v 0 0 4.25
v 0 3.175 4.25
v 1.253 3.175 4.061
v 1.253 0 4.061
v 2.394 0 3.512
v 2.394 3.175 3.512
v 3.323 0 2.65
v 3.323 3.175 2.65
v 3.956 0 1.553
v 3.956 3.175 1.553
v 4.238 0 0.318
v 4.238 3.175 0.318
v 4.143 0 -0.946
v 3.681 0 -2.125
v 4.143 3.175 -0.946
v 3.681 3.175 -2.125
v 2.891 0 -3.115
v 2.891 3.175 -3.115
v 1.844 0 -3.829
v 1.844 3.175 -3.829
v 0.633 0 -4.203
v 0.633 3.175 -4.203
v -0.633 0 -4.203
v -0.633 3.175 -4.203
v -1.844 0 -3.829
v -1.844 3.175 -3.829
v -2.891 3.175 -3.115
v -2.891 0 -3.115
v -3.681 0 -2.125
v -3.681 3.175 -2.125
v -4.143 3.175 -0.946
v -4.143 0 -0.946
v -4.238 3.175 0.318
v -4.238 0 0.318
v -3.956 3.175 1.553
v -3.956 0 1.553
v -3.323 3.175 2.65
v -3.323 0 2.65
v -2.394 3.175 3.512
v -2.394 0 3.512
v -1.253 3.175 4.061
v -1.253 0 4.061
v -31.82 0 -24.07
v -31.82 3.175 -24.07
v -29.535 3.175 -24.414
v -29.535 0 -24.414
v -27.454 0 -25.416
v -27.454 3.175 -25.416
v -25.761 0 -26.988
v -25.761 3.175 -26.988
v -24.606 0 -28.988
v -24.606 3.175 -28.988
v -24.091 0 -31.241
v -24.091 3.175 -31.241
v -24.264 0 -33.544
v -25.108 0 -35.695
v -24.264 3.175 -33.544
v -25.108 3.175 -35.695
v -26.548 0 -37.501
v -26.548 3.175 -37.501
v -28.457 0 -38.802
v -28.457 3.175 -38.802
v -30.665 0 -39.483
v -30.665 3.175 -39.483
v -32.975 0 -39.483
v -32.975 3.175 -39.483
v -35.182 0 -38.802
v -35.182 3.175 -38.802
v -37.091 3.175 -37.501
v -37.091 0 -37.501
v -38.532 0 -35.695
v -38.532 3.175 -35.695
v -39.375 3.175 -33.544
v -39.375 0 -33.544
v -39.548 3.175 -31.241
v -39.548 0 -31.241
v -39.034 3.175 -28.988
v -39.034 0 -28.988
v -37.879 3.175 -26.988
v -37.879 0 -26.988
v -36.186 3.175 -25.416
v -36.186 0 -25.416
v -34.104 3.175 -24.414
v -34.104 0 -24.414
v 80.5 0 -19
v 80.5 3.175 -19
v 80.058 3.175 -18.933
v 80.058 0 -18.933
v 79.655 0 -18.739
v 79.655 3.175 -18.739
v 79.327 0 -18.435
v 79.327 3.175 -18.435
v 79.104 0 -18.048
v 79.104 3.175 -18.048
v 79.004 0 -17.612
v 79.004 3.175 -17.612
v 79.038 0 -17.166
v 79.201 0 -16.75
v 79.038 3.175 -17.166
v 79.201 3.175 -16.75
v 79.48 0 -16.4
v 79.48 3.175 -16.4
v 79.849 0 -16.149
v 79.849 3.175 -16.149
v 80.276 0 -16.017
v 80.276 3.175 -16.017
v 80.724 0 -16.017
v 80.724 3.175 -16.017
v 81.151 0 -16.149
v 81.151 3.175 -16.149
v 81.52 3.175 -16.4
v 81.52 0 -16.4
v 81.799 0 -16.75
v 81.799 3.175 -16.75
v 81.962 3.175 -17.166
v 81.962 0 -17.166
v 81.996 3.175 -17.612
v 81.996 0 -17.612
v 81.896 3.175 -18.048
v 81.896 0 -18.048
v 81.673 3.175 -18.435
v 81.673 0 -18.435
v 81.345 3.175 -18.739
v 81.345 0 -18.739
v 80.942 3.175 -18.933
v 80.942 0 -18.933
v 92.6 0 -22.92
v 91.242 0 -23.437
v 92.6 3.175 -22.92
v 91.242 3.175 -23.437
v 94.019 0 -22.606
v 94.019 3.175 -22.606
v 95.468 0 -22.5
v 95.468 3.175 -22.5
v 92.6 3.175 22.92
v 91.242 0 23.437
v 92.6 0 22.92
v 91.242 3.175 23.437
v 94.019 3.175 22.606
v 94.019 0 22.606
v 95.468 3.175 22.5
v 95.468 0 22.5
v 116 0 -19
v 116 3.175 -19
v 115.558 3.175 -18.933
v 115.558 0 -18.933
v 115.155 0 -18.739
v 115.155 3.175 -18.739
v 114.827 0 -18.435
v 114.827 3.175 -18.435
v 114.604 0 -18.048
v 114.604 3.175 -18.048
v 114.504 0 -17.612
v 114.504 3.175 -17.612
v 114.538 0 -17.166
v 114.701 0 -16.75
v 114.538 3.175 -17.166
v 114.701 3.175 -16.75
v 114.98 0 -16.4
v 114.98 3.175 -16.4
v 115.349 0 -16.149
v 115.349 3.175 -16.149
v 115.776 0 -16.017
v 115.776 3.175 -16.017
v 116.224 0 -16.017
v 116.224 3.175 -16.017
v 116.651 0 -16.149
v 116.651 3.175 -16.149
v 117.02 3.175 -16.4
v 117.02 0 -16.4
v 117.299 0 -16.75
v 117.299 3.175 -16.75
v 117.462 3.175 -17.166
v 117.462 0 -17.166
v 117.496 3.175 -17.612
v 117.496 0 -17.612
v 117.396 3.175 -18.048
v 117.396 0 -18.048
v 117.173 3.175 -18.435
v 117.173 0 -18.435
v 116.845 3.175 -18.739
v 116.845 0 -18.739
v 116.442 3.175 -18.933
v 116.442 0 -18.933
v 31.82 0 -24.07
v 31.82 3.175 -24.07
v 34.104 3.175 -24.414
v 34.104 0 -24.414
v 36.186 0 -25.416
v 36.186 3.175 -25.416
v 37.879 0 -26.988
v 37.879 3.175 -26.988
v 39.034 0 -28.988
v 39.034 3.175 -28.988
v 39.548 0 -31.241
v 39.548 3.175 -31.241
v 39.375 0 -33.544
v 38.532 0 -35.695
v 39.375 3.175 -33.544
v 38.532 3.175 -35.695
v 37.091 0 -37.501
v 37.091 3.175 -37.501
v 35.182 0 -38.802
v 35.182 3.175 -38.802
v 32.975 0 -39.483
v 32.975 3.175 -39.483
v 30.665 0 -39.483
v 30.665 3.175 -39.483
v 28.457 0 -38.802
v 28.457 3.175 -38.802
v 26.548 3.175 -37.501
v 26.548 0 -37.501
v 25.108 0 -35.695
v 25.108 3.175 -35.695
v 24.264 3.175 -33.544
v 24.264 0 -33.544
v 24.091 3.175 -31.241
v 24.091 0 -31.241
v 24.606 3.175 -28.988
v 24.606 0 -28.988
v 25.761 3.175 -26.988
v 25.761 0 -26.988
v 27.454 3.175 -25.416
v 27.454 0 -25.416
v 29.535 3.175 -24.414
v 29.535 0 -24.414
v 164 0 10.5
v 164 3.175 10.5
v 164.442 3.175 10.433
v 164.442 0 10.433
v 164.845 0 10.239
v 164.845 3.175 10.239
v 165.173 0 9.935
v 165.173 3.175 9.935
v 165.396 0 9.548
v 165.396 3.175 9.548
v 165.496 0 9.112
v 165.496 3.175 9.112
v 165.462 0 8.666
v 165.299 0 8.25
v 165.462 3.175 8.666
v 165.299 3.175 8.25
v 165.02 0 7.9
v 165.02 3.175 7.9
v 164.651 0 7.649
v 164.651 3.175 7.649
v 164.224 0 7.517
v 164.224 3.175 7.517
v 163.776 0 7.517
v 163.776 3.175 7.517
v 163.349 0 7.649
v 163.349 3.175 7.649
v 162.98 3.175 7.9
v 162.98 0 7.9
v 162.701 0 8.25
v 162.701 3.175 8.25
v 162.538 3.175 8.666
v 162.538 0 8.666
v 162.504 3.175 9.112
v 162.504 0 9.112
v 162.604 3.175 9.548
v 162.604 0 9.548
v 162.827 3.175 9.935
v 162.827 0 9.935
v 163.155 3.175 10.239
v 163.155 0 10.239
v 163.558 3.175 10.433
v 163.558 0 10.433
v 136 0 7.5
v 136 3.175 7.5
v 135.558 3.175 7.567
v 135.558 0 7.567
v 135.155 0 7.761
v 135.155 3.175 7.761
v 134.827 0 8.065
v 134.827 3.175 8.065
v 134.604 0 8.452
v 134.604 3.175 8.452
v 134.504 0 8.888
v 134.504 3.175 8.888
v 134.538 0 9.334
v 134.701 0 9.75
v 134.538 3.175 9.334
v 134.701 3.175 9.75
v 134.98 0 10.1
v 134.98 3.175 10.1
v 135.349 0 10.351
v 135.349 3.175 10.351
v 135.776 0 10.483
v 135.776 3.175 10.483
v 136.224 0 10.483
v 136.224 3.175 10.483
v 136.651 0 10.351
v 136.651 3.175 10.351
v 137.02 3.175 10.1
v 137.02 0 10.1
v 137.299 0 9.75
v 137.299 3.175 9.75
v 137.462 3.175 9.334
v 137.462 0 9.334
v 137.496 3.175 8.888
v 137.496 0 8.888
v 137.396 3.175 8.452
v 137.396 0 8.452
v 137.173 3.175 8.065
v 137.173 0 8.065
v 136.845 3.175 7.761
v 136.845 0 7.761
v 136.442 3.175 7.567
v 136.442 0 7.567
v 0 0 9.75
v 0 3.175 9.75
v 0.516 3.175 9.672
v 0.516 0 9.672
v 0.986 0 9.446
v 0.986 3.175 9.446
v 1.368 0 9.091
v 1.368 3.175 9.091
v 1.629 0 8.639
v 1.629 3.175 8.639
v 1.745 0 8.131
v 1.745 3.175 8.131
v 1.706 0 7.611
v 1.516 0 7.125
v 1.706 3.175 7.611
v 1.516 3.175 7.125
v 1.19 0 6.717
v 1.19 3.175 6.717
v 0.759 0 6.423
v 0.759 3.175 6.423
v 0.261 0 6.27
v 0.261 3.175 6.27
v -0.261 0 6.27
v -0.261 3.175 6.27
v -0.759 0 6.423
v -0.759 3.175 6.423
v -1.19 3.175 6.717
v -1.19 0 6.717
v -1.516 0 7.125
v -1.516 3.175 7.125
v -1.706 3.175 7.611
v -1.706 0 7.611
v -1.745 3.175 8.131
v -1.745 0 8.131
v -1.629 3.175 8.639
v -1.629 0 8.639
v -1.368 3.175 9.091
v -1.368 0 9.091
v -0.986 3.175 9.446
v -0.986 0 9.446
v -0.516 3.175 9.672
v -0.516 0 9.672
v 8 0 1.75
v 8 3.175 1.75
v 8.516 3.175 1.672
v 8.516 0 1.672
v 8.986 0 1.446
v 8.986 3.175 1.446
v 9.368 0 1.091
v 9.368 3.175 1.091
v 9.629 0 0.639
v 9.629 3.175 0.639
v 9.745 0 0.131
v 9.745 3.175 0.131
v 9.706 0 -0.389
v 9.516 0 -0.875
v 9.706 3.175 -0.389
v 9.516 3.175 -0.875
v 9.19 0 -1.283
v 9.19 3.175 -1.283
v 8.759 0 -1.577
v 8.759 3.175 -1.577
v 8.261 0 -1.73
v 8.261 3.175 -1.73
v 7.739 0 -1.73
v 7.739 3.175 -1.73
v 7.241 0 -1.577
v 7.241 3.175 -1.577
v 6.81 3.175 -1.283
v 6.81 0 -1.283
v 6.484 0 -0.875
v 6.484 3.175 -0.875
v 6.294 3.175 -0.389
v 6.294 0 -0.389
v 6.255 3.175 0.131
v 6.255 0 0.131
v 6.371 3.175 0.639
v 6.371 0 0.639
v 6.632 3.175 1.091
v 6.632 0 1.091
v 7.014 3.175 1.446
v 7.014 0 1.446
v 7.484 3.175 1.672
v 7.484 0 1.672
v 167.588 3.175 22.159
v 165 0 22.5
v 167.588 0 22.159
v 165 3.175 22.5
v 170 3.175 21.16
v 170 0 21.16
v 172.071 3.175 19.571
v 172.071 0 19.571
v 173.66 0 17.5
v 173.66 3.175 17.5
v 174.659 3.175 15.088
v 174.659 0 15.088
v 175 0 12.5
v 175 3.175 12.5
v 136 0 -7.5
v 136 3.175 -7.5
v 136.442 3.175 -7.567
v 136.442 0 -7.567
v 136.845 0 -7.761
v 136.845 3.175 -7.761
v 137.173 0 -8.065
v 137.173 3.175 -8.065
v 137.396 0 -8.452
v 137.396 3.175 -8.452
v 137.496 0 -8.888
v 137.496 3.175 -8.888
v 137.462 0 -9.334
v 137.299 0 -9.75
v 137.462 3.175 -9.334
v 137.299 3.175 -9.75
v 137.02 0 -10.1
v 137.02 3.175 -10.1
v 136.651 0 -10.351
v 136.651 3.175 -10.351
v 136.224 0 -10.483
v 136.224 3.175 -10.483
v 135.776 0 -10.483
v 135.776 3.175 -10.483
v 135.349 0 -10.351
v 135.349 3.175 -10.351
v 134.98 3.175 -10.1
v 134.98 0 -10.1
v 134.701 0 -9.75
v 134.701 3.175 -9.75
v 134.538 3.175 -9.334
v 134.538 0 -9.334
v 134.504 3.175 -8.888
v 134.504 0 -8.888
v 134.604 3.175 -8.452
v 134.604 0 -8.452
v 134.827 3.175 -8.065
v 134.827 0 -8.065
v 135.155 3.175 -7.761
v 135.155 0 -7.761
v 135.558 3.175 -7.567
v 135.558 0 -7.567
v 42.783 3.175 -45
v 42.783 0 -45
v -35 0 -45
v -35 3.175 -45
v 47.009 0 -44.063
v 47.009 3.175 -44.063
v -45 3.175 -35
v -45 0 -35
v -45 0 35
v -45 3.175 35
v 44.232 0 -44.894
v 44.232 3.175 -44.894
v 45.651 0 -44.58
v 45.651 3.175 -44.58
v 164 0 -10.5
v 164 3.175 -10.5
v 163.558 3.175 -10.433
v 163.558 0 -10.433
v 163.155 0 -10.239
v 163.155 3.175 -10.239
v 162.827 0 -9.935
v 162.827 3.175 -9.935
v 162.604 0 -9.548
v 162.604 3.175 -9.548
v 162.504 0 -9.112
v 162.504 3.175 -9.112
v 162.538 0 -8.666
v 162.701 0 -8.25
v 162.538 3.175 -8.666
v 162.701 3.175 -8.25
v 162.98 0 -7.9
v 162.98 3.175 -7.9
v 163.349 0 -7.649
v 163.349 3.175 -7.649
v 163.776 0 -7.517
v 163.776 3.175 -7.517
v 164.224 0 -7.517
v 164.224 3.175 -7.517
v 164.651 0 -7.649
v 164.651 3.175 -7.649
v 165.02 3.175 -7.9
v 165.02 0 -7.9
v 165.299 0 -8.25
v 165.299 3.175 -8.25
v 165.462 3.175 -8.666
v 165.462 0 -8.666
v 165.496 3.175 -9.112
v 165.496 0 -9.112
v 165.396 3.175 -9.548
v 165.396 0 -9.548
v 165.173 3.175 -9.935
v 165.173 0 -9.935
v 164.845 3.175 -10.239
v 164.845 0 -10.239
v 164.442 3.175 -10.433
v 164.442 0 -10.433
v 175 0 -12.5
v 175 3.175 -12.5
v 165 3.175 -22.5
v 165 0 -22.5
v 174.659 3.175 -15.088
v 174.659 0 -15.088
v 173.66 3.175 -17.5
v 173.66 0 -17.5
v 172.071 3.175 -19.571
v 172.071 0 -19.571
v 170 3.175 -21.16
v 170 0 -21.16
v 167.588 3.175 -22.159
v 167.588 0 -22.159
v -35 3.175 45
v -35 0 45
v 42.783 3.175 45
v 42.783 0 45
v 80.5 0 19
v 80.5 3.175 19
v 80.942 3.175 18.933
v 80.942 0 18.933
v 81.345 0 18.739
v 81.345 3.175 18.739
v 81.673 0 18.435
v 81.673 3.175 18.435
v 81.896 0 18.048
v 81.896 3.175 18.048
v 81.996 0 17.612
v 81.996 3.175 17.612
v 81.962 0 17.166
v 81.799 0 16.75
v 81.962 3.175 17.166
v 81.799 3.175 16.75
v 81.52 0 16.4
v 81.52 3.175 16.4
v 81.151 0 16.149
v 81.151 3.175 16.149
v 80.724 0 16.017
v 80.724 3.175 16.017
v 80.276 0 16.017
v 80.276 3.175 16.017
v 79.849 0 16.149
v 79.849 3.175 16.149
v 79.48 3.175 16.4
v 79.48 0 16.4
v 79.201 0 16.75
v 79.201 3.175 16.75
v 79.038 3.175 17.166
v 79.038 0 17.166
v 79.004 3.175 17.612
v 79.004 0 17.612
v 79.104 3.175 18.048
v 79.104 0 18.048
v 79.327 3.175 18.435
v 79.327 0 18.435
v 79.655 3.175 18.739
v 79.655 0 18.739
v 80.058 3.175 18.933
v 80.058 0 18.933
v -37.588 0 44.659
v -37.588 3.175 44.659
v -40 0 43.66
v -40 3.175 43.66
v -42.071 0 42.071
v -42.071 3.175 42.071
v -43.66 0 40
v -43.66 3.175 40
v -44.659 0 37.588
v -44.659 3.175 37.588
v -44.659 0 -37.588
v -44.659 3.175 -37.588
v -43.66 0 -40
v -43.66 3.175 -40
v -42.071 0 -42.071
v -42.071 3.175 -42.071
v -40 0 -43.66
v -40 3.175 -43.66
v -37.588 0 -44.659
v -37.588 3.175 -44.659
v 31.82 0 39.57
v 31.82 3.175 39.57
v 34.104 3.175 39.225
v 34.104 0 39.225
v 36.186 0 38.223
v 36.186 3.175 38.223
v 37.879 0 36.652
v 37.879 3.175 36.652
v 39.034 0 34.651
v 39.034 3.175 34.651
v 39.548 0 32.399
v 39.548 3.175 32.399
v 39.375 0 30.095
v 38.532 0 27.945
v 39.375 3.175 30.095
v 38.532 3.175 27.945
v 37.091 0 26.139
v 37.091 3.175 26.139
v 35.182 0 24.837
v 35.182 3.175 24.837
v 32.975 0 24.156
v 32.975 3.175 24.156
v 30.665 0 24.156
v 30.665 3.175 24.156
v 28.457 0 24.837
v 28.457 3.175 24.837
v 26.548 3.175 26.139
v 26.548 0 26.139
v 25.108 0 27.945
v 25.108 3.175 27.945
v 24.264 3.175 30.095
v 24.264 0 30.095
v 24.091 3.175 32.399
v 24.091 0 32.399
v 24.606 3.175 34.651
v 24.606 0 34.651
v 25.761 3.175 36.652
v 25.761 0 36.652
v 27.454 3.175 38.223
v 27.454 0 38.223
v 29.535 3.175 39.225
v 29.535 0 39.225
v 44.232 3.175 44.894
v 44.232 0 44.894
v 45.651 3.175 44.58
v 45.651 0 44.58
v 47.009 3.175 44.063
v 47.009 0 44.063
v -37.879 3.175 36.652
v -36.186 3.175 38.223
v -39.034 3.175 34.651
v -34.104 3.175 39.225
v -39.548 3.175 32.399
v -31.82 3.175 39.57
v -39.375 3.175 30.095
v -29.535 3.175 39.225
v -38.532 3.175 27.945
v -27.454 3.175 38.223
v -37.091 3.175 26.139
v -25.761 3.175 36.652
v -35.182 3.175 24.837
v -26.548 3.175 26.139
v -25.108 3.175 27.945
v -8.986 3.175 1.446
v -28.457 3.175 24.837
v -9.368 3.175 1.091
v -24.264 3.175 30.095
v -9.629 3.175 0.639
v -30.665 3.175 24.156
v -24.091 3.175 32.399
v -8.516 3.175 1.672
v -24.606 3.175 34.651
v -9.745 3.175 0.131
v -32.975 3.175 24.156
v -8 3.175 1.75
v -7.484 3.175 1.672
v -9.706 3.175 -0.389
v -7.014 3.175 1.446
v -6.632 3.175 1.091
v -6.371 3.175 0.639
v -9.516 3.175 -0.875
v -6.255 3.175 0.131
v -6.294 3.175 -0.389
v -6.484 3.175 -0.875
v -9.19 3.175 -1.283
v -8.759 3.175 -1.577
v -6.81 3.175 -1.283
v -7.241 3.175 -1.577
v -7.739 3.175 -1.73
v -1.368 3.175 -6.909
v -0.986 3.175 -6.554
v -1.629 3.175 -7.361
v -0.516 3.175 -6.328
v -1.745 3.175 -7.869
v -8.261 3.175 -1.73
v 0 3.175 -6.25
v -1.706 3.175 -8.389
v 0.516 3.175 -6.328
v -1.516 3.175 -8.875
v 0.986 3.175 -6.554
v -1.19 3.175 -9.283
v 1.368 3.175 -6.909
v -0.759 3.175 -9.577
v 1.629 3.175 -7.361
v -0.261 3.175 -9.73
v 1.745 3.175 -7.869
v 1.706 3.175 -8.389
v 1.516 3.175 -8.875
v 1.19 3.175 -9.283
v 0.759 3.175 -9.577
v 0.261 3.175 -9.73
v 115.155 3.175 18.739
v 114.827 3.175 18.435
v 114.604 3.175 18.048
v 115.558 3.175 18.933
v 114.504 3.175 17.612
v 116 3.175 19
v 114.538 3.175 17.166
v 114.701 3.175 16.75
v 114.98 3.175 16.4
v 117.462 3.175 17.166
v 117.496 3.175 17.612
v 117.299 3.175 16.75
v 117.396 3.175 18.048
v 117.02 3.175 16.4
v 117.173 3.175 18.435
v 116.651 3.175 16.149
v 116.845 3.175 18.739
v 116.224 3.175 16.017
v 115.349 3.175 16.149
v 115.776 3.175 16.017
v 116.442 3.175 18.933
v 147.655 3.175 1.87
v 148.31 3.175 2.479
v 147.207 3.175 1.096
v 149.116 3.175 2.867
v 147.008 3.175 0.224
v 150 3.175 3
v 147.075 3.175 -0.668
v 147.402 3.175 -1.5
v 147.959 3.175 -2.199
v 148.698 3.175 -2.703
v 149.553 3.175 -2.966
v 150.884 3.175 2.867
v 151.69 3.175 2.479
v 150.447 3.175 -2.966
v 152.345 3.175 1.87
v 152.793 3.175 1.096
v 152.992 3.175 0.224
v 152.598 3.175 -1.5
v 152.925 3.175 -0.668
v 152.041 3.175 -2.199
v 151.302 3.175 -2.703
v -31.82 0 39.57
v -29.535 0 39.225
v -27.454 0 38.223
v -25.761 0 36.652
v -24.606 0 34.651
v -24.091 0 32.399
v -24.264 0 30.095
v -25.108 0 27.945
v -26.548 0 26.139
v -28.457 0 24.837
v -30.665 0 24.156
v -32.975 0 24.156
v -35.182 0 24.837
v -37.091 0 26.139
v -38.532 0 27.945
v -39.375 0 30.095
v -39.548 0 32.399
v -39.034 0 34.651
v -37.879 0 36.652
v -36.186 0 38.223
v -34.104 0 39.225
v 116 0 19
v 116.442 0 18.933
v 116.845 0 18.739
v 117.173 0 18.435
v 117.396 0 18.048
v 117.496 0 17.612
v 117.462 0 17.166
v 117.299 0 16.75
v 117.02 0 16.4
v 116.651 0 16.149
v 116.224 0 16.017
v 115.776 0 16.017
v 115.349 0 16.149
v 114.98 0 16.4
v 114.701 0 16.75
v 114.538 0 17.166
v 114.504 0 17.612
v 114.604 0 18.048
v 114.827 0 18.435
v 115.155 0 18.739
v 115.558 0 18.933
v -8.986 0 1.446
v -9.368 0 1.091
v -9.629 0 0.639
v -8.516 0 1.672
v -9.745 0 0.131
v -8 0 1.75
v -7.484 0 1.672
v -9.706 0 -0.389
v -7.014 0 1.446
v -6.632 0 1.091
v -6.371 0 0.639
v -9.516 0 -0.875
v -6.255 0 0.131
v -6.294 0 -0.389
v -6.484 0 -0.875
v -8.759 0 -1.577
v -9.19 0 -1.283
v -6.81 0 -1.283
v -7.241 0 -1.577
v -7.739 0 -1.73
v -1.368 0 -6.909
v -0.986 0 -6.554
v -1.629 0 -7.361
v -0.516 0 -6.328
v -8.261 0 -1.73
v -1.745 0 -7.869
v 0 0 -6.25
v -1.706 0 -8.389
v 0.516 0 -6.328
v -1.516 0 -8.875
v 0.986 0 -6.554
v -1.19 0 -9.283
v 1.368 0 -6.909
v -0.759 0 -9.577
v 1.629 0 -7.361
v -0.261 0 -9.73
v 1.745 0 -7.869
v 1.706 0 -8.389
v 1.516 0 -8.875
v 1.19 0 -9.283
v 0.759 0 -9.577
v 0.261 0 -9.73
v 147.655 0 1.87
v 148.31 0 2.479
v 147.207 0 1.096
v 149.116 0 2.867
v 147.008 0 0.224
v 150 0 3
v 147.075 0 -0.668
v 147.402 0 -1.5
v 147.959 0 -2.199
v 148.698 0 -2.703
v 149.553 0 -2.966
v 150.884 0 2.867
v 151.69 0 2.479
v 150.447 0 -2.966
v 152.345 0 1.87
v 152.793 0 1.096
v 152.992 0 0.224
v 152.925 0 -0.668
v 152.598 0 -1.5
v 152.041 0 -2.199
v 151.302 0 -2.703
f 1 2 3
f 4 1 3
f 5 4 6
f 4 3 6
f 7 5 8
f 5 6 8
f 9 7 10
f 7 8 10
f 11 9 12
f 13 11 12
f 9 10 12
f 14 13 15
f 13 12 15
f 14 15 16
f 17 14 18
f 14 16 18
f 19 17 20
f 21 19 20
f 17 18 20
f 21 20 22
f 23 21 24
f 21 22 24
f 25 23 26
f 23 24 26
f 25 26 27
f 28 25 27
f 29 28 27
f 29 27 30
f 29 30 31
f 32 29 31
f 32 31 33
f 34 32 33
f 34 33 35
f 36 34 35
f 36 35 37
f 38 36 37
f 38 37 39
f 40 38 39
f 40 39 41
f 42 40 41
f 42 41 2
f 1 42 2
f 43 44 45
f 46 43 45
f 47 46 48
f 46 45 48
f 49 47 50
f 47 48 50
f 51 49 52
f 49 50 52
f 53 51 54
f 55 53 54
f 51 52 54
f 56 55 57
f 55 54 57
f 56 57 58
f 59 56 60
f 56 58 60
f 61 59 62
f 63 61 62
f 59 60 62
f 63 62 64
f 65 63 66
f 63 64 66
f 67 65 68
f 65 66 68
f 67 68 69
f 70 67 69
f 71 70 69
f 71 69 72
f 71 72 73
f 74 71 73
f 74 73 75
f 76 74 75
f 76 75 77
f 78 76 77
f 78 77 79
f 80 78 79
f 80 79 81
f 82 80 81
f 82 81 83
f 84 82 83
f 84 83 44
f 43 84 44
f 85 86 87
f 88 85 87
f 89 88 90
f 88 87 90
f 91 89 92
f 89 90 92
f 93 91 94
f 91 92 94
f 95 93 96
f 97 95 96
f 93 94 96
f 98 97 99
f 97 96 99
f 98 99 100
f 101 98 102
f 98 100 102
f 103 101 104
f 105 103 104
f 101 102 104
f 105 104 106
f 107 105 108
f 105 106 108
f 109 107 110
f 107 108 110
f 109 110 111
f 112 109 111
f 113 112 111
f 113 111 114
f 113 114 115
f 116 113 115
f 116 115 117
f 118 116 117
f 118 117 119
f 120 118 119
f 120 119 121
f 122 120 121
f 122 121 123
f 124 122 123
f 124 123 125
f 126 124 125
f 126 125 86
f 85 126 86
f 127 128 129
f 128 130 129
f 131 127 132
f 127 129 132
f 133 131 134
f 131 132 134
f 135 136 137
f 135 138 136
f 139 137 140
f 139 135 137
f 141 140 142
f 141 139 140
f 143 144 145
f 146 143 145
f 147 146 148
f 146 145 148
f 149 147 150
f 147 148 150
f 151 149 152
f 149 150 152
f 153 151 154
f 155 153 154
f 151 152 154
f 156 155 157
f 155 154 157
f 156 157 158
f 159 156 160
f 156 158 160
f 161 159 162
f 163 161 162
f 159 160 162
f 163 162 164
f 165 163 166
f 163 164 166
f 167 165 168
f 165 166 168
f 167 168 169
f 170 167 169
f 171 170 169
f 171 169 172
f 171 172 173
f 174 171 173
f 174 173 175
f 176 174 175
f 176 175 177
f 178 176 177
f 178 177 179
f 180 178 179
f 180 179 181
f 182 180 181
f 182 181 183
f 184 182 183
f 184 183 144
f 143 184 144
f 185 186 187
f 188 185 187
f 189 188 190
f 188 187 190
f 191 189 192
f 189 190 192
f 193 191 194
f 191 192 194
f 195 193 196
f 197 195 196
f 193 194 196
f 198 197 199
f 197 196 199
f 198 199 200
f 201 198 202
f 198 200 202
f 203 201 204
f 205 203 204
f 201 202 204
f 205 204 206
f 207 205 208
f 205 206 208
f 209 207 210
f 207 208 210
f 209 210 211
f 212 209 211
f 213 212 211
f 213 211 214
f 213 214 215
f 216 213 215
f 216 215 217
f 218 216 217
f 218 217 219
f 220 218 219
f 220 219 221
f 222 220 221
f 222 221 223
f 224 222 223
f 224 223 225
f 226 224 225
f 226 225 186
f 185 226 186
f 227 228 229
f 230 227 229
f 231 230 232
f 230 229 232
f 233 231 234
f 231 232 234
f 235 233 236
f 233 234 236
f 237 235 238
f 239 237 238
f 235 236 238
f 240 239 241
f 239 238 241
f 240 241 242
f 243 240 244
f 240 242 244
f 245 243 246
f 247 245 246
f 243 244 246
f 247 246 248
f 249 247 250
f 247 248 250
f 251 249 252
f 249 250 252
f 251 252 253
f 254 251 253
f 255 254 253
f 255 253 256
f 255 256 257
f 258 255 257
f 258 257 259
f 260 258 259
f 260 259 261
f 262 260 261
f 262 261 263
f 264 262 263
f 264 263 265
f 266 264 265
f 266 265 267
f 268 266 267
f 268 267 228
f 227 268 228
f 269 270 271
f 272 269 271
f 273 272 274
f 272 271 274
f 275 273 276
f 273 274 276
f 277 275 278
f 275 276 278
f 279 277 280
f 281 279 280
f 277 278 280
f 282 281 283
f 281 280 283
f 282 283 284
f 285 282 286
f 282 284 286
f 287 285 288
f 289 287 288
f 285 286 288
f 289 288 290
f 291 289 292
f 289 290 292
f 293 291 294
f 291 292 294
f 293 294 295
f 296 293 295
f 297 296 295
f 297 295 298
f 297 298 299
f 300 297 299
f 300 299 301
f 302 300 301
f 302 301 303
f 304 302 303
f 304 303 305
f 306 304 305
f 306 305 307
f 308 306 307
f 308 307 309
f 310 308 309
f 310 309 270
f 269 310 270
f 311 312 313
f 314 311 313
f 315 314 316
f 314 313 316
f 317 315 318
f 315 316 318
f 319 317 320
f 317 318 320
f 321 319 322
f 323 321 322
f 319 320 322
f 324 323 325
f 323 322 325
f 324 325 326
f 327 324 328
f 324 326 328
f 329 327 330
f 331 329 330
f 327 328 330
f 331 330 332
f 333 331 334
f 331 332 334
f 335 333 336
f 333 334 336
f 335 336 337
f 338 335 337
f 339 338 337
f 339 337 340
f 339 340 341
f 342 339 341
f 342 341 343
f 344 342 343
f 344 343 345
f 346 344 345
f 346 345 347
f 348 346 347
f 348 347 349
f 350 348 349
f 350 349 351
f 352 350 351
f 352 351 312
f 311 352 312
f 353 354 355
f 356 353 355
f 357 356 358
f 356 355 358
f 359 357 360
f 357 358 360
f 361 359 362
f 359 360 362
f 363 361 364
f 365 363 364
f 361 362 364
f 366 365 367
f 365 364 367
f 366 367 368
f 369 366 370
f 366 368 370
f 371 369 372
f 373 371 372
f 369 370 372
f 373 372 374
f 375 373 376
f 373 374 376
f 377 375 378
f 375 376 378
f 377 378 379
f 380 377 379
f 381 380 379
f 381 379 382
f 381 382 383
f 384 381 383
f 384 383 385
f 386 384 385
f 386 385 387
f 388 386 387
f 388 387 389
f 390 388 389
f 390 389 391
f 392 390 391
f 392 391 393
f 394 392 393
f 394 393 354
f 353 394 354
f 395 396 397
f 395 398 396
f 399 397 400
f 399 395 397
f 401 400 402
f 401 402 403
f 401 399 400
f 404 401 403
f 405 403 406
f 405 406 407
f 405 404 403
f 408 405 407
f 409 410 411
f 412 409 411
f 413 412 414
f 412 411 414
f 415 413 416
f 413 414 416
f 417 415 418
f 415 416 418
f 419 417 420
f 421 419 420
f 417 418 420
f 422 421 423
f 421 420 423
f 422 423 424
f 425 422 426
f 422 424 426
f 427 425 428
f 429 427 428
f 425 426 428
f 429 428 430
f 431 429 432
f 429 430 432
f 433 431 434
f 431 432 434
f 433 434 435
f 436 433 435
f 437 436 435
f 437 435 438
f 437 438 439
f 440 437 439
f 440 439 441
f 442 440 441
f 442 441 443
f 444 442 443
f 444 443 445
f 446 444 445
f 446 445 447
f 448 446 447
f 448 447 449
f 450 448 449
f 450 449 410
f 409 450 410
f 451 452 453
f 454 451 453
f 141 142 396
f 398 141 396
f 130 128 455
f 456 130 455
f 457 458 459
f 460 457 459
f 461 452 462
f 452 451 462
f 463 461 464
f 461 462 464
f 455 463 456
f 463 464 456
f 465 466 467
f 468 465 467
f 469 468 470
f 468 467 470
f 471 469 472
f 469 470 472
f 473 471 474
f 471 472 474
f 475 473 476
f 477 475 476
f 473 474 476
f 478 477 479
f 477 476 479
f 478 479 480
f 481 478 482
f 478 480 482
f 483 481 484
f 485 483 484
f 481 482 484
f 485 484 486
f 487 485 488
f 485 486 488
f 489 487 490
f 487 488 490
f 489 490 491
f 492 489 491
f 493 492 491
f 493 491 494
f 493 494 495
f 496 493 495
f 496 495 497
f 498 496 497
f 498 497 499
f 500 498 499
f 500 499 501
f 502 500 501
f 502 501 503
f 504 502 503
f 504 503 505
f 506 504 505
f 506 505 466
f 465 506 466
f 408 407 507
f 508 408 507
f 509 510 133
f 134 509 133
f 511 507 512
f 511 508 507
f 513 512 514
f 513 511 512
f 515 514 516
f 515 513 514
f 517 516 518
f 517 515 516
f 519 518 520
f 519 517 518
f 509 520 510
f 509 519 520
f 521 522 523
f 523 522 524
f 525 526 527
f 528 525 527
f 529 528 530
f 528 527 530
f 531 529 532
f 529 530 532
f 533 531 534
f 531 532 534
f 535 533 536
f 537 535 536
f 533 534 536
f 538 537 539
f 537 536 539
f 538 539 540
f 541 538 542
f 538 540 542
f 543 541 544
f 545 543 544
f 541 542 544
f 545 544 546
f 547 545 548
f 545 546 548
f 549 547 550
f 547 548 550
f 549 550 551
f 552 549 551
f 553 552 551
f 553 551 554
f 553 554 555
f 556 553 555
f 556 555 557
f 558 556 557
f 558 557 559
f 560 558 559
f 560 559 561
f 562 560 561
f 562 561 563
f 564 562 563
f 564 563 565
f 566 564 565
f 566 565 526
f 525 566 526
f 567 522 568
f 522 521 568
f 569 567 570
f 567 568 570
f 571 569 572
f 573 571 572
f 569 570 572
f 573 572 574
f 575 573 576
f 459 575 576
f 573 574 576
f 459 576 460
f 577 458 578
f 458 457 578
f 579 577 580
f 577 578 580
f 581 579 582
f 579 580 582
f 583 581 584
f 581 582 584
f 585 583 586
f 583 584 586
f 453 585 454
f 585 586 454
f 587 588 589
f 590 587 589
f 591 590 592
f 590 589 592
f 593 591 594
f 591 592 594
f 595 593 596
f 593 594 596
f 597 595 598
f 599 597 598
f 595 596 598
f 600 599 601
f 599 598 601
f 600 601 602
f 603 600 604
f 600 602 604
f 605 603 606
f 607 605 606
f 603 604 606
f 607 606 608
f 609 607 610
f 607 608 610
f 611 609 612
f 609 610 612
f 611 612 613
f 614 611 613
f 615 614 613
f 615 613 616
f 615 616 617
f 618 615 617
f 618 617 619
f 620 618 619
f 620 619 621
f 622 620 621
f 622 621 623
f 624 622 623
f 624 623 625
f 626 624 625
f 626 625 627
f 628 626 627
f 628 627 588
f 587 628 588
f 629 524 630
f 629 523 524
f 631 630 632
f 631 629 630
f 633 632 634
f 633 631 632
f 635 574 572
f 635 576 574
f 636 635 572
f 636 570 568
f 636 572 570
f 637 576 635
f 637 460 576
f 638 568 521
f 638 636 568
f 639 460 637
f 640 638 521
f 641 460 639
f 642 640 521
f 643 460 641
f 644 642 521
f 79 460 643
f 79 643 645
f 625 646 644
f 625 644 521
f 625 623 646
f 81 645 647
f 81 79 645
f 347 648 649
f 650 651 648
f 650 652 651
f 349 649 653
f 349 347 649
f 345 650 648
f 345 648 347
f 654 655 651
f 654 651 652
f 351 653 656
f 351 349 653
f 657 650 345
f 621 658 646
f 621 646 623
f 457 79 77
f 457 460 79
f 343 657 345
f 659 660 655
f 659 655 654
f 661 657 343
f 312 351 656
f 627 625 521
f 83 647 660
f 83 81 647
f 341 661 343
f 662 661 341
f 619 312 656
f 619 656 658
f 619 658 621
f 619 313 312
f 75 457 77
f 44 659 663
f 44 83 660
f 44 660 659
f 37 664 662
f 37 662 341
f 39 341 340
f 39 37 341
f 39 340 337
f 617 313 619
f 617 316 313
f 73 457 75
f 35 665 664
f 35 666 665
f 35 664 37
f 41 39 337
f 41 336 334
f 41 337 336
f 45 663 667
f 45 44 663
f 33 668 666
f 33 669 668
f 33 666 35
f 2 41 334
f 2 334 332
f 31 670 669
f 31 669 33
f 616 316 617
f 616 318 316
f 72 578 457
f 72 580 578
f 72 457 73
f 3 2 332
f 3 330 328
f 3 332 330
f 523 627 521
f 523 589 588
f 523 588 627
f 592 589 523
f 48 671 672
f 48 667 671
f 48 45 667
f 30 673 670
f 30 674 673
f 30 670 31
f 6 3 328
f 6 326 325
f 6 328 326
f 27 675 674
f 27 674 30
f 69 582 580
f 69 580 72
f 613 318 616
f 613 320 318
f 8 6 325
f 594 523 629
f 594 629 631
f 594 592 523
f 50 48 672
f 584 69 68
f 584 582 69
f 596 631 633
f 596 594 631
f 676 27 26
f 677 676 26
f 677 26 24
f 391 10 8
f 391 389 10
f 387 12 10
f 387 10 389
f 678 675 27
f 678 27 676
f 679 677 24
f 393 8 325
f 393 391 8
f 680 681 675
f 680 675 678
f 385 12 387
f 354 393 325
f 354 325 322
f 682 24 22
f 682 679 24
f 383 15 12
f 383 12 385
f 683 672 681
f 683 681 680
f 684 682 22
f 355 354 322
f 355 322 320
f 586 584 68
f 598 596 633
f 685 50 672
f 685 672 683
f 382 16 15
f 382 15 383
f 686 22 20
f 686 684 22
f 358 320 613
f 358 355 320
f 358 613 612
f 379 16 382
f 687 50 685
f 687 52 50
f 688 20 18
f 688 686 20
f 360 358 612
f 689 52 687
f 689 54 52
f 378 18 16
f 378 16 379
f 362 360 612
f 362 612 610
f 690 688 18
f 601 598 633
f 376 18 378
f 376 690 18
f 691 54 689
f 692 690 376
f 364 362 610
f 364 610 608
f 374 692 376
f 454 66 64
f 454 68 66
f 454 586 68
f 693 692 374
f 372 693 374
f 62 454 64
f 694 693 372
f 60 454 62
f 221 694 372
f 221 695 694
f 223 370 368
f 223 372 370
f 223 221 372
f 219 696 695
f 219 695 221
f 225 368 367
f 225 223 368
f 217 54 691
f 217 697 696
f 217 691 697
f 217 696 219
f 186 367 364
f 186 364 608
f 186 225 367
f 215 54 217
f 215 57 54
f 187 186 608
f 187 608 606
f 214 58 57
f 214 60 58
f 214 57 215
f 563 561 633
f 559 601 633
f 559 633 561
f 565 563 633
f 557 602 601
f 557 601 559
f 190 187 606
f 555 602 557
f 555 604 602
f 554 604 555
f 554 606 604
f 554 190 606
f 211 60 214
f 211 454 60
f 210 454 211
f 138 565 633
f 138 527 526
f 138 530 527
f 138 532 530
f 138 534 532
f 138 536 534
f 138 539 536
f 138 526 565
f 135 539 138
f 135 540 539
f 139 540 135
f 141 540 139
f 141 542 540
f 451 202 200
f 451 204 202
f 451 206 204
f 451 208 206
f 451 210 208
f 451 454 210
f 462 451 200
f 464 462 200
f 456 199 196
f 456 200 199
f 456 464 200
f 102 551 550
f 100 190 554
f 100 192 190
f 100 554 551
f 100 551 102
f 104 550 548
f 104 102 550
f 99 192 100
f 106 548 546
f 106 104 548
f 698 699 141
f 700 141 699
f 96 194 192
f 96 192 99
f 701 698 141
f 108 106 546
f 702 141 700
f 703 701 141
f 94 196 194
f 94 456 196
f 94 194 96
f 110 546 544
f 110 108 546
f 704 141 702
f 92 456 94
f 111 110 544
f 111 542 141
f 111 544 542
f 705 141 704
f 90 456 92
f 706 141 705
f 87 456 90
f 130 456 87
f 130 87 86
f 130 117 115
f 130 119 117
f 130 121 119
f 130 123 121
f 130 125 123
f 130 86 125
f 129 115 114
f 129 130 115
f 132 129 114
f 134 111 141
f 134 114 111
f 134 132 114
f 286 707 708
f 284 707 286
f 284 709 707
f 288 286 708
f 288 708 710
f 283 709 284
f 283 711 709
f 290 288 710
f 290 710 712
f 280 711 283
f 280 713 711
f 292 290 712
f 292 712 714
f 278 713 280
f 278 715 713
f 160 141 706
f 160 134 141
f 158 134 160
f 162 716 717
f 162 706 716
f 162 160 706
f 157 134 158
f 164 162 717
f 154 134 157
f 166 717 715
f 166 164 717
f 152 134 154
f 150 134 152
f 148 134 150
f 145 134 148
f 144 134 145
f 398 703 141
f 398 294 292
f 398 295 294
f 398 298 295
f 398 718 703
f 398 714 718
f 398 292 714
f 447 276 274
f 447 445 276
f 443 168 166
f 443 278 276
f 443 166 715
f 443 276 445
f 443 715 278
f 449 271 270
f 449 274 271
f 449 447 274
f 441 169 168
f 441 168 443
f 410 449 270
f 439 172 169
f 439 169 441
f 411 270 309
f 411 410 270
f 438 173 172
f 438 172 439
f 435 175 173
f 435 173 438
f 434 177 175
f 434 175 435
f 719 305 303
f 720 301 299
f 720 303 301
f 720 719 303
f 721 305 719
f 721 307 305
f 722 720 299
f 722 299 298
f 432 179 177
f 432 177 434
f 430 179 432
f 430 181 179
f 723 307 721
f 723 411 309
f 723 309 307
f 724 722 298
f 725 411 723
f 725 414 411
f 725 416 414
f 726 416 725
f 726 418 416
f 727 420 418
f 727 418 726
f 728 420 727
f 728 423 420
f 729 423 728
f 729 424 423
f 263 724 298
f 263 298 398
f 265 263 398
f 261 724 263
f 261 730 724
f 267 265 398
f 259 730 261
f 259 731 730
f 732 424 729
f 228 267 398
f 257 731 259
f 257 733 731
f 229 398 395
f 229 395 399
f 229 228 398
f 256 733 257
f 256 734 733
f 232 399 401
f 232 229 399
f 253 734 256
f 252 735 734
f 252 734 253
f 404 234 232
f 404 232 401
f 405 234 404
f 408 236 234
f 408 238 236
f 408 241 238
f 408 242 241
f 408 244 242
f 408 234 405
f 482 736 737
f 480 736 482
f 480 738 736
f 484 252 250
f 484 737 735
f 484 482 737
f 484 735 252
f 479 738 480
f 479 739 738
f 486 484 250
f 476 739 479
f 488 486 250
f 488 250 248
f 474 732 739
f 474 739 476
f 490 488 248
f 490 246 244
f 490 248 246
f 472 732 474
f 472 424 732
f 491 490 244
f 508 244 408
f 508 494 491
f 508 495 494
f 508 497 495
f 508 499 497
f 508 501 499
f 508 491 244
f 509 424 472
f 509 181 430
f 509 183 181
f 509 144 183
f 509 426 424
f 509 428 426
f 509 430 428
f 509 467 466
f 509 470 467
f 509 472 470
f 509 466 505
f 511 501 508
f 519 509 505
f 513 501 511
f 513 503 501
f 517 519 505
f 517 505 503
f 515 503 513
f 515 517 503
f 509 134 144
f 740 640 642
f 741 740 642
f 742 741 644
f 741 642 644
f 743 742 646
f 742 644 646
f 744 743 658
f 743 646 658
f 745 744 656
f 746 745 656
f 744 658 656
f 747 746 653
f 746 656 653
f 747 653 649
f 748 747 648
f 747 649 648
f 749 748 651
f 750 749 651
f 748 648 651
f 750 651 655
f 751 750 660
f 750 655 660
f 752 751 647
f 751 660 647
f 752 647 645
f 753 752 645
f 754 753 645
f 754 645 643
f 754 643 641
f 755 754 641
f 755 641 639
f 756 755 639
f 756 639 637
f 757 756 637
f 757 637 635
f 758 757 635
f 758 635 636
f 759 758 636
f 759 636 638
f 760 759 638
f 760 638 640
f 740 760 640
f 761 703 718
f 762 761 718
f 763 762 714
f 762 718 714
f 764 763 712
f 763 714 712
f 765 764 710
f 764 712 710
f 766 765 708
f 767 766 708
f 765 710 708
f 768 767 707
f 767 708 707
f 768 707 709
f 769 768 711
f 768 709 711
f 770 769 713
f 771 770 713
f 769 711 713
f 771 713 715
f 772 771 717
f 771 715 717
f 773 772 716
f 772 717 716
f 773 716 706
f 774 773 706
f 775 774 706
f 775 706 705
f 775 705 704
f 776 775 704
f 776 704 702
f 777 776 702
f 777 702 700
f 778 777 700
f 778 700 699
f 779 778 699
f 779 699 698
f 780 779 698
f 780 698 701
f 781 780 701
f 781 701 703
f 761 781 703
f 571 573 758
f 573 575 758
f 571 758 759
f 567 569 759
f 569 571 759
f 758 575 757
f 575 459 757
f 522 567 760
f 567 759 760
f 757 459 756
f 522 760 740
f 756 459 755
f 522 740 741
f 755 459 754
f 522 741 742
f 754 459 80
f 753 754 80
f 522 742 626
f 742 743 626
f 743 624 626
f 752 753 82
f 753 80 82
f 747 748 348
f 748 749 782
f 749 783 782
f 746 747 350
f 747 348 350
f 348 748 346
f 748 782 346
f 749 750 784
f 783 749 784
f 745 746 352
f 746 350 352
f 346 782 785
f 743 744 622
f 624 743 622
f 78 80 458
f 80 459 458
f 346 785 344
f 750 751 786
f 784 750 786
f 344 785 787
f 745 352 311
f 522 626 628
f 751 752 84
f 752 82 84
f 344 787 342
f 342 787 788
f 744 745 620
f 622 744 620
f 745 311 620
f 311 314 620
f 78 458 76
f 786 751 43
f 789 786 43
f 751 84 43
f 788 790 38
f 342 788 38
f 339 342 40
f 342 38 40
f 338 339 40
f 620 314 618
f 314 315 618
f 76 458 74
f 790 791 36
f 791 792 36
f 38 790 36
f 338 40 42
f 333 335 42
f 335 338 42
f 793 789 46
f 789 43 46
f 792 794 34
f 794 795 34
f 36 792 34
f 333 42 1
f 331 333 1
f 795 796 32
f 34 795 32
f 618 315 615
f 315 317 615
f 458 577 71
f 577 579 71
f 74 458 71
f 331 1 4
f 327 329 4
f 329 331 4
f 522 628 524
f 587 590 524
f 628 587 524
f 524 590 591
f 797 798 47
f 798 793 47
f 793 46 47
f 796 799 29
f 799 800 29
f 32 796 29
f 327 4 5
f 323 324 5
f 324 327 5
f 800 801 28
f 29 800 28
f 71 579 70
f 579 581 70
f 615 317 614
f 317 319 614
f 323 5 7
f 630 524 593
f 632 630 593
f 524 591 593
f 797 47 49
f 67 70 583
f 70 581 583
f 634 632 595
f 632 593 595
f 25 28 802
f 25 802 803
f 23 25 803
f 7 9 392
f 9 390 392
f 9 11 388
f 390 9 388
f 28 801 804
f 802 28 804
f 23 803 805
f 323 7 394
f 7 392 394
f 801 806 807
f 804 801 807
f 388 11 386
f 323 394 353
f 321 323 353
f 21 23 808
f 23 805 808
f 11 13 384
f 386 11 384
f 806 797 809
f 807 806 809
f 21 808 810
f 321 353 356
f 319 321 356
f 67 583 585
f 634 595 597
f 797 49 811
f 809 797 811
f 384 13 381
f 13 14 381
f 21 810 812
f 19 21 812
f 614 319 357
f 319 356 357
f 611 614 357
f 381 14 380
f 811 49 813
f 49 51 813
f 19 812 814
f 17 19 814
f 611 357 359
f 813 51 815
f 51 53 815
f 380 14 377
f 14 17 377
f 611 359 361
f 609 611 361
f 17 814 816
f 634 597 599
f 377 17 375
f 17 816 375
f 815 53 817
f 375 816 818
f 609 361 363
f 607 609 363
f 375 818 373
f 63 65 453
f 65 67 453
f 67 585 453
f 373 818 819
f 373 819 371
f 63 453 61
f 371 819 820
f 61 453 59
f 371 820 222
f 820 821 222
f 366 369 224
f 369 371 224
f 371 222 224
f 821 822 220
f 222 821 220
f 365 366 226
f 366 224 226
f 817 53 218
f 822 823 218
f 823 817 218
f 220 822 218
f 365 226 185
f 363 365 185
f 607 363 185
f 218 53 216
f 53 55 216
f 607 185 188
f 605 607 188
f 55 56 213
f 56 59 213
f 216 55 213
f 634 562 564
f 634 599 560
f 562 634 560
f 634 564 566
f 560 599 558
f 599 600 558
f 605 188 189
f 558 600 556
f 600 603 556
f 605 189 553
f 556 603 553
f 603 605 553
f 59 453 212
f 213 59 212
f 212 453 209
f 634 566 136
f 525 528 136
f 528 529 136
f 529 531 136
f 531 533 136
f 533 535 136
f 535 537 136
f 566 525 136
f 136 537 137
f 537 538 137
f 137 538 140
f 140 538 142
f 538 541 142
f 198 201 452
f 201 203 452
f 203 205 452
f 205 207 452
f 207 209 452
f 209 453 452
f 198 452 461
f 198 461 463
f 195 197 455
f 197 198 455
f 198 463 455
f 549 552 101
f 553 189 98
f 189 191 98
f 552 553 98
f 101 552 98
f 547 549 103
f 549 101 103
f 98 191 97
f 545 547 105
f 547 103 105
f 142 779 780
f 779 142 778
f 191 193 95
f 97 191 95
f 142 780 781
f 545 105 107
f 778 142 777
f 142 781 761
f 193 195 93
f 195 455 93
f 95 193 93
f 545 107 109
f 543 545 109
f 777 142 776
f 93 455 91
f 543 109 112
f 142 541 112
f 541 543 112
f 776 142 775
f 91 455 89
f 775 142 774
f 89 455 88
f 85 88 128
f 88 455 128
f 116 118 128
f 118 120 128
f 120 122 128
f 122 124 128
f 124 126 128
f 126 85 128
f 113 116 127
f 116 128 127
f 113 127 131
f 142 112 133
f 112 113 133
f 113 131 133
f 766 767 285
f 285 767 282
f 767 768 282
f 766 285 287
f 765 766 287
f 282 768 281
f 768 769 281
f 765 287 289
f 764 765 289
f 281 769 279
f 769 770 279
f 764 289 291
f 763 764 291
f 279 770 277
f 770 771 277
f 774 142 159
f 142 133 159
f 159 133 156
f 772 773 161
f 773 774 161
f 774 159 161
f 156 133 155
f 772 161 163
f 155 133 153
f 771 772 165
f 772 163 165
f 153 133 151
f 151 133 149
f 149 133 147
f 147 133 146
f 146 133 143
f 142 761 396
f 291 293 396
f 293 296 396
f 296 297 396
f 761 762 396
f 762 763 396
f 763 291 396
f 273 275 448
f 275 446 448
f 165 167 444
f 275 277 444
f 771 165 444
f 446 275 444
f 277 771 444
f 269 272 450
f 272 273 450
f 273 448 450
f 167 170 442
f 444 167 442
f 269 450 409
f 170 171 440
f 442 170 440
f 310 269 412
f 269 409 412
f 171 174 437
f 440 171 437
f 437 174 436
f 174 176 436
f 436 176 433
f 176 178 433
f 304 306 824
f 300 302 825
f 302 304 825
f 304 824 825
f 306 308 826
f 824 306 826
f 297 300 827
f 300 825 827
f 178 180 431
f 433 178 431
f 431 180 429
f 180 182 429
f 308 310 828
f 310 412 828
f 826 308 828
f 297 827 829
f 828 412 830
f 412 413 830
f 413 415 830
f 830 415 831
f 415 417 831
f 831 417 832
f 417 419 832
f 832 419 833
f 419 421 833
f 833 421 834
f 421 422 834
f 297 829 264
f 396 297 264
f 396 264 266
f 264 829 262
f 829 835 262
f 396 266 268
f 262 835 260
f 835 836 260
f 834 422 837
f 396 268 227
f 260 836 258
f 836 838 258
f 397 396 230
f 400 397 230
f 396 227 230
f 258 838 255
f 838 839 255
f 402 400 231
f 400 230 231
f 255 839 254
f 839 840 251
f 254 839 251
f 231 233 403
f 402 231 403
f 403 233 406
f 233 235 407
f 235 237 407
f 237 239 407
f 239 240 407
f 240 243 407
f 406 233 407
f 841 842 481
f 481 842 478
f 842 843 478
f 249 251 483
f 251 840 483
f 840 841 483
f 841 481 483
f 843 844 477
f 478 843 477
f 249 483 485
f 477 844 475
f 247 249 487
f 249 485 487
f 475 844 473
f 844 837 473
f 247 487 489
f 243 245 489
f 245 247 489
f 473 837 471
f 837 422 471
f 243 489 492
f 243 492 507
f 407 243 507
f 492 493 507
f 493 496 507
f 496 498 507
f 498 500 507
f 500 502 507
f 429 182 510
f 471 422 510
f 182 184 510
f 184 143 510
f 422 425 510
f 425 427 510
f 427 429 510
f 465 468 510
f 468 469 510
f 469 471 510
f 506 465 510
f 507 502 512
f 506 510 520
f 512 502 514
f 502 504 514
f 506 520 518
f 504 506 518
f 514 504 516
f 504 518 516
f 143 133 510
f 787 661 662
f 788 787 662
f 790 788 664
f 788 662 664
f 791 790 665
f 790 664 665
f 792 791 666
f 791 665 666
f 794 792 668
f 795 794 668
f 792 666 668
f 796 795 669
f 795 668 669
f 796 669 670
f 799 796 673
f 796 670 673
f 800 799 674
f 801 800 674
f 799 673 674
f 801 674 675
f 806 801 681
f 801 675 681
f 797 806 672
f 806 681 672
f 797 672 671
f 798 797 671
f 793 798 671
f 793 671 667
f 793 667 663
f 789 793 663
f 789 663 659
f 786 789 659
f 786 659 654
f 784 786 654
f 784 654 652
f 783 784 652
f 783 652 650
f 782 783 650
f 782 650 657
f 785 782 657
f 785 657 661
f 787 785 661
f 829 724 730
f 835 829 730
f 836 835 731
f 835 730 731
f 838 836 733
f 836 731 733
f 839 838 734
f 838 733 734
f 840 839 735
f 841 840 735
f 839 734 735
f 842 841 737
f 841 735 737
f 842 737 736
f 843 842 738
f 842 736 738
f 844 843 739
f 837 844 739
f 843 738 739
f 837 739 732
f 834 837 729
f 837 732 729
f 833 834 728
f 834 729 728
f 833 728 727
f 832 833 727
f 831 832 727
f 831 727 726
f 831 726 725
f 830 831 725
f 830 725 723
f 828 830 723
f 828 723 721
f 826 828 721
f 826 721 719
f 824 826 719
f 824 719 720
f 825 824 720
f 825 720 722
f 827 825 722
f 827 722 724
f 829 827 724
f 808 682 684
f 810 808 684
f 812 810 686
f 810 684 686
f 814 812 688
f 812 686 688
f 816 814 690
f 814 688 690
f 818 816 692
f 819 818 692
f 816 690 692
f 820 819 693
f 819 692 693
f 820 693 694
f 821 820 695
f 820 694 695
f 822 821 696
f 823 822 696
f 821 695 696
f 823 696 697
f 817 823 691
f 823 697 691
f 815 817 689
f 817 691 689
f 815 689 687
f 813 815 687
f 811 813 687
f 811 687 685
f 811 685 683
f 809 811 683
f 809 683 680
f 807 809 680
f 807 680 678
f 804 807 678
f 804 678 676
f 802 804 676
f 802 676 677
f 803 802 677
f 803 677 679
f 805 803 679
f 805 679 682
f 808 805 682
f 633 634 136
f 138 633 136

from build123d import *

# Parameters (mm, degrees)
BOSS_EXTRUDE1_DEPTH = 3.175
SKETCH4_R           = 3
SKETCH4_R_2         = 1.5
CUT_EXTRUDE1_DEPTH  = 181.721002169
SKETCH5_R           = 4.25
CUT_EXTRUDE2_DEPTH  = 181.721002169
SKETCH10_R          = 1.5
CUT_EXTRUDE4_DEPTH  = 181.721002169
FILLET1_R           = 10
FILLET2_R           = 10
SKETCH11_R          = 7.75
CUT_EXTRUDE5_DEPTH  = 181.721002169
SKETCH13_R          = 1.75
CUT_EXTRUDE6_DEPTH  = 181.721002169


with BuildPart() as part:
    # Sketch1 → Boss-Extrude1 (new body)
    with BuildSketch(Plane(origin=(0, 0, 0), x_dir=(1, 0, 0), z_dir=(0, 1, 0))):
        Polygon((45, -45), (93.251405711, -22.5), (175, -22.5), (175, 22.5), (93.251405711, 22.5), (45, 45), (-45, 45), (-45, -45), align=None)
    extrude(amount=BOSS_EXTRUDE1_DEPTH)

    # Sketch4 → Cut-Extrude1 (cut, through all)
    with BuildSketch(Plane(origin=(0, 3.175, 0), x_dir=(1, 0, 0), z_dir=(0, 1, 0))):
        with Locations(Location((150, 0, 0), (0, 0, 270))):
            Circle(SKETCH4_R)
        with Locations(Location((136, 9, 0), (0, 0, 270))):
            Circle(SKETCH4_R_2)
        with Locations(Location((164, 9, 0), (0, 0, 90))):
            Circle(SKETCH4_R_2)
        with Locations(Location((164, -9, 0), (0, 0, 270))):
            Circle(SKETCH4_R_2)
        with Locations(Location((136, -9, 0), (0, 0, 90))):
            Circle(SKETCH4_R_2)
    extrude(amount=-CUT_EXTRUDE1_DEPTH, mode=Mode.SUBTRACT)

    # Sketch5 → Cut-Extrude2 (cut, through all)
    with BuildSketch(Plane(origin=(0, 3.175, 0), x_dir=(1, 0, 0), z_dir=(0, 1, 0))):
        with Locations(Location((0, 0, 0), (0, 0, 270))):
            Circle(SKETCH5_R)
    extrude(amount=-CUT_EXTRUDE2_DEPTH, mode=Mode.SUBTRACT)

    # Sketch10 → Cut-Extrude4 (cut, through all)
    with BuildSketch(Plane(origin=(0, 3.175, 0), x_dir=(1, 0, 0), z_dir=(0, 1, 0))):
        with Locations(Location((80.5, -17.5, 0), (0, 0, 270))):
            Circle(SKETCH10_R)
        with Locations(Location((116, -17.5, 0), (0, 0, 270))):
            Circle(SKETCH10_R)
        with Locations(Location((116, 17.5, 0), (0, 0, 90))):
            Circle(SKETCH10_R)
        with Locations(Location((80.5, 17.5, 0), (0, 0, 90))):
            Circle(SKETCH10_R)
    extrude(amount=-CUT_EXTRUDE4_DEPTH, mode=Mode.SUBTRACT)

    # Fillet1
    fillet1_edges = [part.edges().sort_by_distance(p)[0] for p in [
        (-45, 1.5875, 45),
        (-45, 1.5875, -45),
        (175, 1.5875, -22.5),
        (175, 1.5875, 22.5),
    ]]
    fillet(fillet1_edges, radius=FILLET1_R)

    # Fillet2
    fillet2_edges = [part.edges().sort_by_distance(p)[0] for p in [
        (93.251405711, 1.5875, 22.5),
        (45, 1.5875, 45),
        (45, 1.5875, -45),
        (93.251405711, 1.5875, -22.5),
    ]]
    fillet(fillet2_edges, radius=FILLET2_R)

    # Sketch11 → Cut-Extrude5 (cut, through all)
    with BuildSketch(Plane(origin=(0, 3.175, 0), x_dir=(1, 0, 0), z_dir=(0, 1, 0))):
        with Locations(Location((-31.819805153, 31.819805153, 0), (0, 0, 270))):
            Circle(SKETCH11_R)
        with Locations(Location((31.819805153, 31.819805153, 0), (0, 0, 270))):
            Circle(SKETCH11_R)
        with Locations(Location((31.819805153, -31.819805153, 0), (0, 0, 270))):
            Circle(SKETCH11_R)
        with Locations(Location((-31.819805153, -31.819805153, 0), (0, 0, 270))):
            Circle(SKETCH11_R)
    extrude(amount=-CUT_EXTRUDE5_DEPTH, mode=Mode.SUBTRACT)

    # Sketch13 → Cut-Extrude6 (cut, through all)
    with BuildSketch(Plane(origin=(0, 3.175, 0), x_dir=(1, 0, 0), z_dir=(0, 1, 0))):
        with Locations(Location((8, 0, 0), (0, 0, 270))):
            Circle(SKETCH13_R)
        with Locations(Location((0, -8, 0), (0, 0, 270))):
            Circle(SKETCH13_R)
        with Locations(Location((-8, 0, 0), (0, 0, 270))):
            Circle(SKETCH13_R)
        with Locations(Location((0, 8, 0), (0, 0, 270))):
            Circle(SKETCH13_R)
    extrude(amount=-CUT_EXTRUDE6_DEPTH, mode=Mode.SUBTRACT)


solid = part.part
